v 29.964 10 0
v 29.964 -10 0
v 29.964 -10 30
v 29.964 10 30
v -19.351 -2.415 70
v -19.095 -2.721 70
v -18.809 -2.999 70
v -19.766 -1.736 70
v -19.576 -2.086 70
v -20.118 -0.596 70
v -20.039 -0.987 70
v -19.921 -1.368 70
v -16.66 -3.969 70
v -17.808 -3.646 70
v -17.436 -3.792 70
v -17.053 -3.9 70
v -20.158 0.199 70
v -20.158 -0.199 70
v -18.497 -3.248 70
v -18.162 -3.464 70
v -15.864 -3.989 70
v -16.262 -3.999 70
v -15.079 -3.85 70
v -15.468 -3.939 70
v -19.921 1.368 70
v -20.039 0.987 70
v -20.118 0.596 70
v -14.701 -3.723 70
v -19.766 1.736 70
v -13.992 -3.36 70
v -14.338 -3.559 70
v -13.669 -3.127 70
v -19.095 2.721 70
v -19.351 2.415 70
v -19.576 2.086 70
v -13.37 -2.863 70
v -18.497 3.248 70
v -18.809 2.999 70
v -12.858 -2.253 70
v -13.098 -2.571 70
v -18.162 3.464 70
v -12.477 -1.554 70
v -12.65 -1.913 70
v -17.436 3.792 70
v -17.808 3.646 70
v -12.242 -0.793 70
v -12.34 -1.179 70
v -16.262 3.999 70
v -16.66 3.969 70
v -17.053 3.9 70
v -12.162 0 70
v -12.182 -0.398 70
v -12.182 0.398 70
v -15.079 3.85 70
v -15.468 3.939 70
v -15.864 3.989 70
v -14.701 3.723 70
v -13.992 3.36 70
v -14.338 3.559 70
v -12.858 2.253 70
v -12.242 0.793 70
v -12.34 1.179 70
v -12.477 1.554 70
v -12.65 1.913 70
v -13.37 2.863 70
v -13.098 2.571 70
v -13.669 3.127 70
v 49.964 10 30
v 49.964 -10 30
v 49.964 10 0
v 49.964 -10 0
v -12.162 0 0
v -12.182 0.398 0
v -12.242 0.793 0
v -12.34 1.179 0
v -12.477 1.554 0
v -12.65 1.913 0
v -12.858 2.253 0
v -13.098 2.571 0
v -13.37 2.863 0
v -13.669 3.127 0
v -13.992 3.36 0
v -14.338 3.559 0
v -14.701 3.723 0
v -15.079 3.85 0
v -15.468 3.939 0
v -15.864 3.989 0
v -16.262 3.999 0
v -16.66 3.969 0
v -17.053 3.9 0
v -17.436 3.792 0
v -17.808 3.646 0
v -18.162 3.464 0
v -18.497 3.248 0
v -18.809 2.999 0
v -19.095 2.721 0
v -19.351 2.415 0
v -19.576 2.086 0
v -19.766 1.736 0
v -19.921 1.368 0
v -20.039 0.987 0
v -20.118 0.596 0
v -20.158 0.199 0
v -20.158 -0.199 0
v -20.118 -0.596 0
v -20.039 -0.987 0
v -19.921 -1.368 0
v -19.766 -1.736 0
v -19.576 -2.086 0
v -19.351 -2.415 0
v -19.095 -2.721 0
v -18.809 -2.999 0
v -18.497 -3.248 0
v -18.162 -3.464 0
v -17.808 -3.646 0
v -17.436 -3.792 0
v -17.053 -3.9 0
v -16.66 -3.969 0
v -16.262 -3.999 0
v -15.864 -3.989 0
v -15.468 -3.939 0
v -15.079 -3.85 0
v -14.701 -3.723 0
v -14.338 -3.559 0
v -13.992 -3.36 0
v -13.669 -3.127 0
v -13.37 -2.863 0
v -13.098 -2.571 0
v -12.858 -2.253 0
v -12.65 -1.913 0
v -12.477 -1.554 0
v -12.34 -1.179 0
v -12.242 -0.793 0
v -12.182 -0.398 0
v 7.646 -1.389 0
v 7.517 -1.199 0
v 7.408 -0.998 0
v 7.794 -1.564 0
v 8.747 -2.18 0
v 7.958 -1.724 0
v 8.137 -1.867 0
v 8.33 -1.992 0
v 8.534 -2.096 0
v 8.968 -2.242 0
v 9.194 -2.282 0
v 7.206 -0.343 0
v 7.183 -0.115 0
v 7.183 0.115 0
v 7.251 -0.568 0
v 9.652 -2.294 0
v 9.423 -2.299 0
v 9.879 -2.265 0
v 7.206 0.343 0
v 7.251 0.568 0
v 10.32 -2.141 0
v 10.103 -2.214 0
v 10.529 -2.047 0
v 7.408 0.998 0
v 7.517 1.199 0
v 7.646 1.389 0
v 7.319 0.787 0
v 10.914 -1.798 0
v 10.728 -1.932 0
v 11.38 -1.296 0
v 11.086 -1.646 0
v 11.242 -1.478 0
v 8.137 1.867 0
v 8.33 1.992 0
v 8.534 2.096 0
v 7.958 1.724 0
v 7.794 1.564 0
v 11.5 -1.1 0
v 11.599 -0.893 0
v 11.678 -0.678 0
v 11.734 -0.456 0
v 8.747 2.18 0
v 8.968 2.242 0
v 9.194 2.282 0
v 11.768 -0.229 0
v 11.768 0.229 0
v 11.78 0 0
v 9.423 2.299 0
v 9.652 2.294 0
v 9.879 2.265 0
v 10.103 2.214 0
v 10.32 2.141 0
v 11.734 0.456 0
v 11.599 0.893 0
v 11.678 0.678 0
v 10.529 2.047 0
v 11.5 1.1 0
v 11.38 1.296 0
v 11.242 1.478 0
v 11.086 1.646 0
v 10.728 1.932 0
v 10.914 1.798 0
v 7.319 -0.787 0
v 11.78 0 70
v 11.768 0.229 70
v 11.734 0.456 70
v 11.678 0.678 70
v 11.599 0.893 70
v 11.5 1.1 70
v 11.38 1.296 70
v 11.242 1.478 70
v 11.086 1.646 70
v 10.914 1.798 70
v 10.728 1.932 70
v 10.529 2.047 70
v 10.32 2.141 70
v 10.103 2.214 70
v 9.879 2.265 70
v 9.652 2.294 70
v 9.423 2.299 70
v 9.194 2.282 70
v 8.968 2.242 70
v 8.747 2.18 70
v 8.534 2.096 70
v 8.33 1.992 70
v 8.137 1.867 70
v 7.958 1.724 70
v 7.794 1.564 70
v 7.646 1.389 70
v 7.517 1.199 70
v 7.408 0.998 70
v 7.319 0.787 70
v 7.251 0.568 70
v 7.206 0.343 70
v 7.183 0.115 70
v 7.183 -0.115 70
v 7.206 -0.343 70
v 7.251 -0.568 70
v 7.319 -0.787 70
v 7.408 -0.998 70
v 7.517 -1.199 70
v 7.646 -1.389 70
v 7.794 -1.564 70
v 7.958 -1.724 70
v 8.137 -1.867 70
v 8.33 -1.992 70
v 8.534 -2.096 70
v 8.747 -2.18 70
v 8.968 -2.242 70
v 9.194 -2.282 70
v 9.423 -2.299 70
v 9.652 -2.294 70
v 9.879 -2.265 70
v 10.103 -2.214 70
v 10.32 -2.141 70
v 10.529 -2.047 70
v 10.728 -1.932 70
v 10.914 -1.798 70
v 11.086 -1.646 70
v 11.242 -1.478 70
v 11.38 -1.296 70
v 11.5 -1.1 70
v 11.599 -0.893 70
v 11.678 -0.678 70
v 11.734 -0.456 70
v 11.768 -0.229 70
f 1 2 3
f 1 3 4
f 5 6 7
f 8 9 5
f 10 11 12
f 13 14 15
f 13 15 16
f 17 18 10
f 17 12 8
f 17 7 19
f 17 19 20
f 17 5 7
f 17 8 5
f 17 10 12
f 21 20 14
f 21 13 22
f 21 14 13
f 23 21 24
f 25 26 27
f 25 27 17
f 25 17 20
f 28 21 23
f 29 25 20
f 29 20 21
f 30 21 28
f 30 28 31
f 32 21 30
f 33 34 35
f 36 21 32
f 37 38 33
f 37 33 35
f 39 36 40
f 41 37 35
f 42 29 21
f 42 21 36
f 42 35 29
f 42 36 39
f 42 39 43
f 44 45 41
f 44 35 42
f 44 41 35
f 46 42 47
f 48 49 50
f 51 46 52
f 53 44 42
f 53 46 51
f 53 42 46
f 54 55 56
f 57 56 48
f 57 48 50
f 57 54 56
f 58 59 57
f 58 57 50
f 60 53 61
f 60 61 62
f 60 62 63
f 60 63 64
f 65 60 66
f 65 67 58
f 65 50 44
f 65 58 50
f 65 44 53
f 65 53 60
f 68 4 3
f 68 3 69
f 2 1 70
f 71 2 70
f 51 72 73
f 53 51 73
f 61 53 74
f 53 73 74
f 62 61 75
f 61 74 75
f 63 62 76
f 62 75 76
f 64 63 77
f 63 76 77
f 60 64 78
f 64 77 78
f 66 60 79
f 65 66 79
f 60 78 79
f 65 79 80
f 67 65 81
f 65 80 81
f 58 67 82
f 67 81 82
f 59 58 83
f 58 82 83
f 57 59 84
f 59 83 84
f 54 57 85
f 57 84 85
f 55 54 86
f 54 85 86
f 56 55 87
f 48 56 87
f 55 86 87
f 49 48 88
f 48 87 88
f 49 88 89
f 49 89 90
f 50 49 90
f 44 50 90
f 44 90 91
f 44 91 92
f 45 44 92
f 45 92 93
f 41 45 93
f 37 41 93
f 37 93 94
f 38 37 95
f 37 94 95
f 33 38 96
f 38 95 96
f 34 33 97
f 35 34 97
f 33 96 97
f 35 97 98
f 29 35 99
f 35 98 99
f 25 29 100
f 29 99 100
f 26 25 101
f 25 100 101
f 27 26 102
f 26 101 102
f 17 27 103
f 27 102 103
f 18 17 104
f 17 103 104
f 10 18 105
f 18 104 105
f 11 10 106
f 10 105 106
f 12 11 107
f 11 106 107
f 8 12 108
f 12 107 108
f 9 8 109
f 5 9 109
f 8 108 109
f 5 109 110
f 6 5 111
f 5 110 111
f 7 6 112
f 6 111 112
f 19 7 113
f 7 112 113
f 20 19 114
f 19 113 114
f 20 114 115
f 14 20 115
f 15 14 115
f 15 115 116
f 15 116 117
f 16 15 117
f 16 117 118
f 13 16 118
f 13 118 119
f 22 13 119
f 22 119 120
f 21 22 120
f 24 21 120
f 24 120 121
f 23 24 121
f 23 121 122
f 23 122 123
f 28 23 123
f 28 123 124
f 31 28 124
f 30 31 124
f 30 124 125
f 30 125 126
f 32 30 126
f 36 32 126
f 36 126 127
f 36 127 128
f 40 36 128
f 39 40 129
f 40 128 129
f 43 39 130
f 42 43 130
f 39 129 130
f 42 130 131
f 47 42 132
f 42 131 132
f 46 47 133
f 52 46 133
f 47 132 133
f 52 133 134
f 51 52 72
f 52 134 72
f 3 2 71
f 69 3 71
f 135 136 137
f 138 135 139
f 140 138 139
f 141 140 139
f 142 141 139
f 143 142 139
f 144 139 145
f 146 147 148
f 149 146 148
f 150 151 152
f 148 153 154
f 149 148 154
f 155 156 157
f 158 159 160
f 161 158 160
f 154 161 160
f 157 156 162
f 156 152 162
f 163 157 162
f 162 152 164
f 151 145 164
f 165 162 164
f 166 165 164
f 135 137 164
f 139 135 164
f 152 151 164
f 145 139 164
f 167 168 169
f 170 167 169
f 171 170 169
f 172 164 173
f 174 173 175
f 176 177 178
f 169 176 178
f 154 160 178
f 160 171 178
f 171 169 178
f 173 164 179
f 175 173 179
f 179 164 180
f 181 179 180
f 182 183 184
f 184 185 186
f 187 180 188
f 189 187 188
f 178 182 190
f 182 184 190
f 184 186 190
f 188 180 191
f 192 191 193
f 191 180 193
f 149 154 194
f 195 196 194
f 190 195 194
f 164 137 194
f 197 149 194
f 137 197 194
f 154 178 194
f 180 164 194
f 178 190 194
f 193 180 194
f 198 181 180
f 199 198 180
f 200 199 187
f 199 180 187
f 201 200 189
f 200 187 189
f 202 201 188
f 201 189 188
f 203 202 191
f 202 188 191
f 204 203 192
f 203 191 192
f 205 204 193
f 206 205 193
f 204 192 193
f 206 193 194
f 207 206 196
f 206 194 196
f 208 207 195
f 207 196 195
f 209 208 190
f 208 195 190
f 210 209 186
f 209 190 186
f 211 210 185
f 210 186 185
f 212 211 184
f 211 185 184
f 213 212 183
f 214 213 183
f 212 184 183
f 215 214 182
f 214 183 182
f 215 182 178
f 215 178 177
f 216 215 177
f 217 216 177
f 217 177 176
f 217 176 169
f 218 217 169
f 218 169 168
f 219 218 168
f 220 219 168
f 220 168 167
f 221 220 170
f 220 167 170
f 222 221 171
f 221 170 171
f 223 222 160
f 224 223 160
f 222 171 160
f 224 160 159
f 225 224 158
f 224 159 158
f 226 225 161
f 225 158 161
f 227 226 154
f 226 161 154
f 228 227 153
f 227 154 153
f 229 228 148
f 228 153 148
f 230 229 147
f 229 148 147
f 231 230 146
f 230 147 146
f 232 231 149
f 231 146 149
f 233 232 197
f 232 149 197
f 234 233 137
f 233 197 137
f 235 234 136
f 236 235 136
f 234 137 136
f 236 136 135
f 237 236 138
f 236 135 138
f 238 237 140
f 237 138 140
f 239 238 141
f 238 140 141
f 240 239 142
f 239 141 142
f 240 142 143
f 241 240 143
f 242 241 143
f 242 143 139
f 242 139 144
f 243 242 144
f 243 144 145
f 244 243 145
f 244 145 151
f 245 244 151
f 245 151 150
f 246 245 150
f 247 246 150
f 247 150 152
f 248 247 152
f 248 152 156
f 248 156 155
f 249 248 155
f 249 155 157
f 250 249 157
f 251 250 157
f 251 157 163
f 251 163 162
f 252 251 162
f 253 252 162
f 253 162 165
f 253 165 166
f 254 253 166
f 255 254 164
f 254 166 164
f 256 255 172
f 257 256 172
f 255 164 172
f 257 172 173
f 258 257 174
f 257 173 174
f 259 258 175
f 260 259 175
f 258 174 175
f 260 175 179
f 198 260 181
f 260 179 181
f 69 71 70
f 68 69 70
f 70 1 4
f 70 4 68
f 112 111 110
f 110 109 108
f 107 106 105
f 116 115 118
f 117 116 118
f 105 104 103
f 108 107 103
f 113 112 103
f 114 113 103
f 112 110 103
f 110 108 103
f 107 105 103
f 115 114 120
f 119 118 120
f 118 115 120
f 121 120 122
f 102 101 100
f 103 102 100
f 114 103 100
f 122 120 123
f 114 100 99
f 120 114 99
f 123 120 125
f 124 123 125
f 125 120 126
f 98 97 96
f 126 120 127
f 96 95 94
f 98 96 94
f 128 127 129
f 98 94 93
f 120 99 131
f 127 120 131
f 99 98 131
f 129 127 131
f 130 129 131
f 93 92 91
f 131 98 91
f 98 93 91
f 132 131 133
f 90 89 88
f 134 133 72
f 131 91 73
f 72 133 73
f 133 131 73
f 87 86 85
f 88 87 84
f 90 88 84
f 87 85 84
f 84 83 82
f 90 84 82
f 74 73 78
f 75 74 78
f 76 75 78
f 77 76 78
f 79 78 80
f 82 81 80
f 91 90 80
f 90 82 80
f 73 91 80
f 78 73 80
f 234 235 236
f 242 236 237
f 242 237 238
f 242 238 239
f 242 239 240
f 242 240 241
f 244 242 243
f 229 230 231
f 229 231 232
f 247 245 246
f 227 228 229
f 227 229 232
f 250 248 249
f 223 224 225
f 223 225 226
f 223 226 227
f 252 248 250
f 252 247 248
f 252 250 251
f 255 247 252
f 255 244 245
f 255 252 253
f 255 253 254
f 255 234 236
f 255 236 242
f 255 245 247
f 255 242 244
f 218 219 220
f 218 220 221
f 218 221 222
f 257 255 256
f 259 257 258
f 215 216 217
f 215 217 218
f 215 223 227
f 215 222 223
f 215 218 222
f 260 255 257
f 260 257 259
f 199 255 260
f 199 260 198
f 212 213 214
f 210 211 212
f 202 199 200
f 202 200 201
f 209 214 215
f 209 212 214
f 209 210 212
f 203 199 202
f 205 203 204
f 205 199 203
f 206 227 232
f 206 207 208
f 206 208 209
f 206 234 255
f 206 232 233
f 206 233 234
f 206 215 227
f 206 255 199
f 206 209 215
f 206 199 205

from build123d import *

# Parameters (mm, degrees)
F0_R     = 4
F1_DEPTH = 70
F2_R     = 2.3
F3_DEPTH = 70
F4_W     = 20
F4_H     = 20
F5_DEPTH = 30


with BuildPart() as f1:
    # F0 (on Top) → F1 (new body)
    with BuildSketch(Plane.XY):
        with Locations((-16.16248, 0)):
            Circle(F0_R)
    extrude(amount=F1_DEPTH)


with BuildPart() as f3:
    # F2 (on Top) → F3 (new body)
    with BuildSketch(Plane.XY):
        with Locations((9.479851, 0)):
            Circle(F2_R)
    extrude(amount=F3_DEPTH)


with BuildPart() as f5:
    # F4 (on Top) → F5 (new body)
    with BuildSketch(Plane.XY):
        with Locations((39.96409, 0)):
            Rectangle(F4_W, F4_H)
    extrude(amount=F5_DEPTH)


solid = Compound([f1.part, f3.part, f5.part])
